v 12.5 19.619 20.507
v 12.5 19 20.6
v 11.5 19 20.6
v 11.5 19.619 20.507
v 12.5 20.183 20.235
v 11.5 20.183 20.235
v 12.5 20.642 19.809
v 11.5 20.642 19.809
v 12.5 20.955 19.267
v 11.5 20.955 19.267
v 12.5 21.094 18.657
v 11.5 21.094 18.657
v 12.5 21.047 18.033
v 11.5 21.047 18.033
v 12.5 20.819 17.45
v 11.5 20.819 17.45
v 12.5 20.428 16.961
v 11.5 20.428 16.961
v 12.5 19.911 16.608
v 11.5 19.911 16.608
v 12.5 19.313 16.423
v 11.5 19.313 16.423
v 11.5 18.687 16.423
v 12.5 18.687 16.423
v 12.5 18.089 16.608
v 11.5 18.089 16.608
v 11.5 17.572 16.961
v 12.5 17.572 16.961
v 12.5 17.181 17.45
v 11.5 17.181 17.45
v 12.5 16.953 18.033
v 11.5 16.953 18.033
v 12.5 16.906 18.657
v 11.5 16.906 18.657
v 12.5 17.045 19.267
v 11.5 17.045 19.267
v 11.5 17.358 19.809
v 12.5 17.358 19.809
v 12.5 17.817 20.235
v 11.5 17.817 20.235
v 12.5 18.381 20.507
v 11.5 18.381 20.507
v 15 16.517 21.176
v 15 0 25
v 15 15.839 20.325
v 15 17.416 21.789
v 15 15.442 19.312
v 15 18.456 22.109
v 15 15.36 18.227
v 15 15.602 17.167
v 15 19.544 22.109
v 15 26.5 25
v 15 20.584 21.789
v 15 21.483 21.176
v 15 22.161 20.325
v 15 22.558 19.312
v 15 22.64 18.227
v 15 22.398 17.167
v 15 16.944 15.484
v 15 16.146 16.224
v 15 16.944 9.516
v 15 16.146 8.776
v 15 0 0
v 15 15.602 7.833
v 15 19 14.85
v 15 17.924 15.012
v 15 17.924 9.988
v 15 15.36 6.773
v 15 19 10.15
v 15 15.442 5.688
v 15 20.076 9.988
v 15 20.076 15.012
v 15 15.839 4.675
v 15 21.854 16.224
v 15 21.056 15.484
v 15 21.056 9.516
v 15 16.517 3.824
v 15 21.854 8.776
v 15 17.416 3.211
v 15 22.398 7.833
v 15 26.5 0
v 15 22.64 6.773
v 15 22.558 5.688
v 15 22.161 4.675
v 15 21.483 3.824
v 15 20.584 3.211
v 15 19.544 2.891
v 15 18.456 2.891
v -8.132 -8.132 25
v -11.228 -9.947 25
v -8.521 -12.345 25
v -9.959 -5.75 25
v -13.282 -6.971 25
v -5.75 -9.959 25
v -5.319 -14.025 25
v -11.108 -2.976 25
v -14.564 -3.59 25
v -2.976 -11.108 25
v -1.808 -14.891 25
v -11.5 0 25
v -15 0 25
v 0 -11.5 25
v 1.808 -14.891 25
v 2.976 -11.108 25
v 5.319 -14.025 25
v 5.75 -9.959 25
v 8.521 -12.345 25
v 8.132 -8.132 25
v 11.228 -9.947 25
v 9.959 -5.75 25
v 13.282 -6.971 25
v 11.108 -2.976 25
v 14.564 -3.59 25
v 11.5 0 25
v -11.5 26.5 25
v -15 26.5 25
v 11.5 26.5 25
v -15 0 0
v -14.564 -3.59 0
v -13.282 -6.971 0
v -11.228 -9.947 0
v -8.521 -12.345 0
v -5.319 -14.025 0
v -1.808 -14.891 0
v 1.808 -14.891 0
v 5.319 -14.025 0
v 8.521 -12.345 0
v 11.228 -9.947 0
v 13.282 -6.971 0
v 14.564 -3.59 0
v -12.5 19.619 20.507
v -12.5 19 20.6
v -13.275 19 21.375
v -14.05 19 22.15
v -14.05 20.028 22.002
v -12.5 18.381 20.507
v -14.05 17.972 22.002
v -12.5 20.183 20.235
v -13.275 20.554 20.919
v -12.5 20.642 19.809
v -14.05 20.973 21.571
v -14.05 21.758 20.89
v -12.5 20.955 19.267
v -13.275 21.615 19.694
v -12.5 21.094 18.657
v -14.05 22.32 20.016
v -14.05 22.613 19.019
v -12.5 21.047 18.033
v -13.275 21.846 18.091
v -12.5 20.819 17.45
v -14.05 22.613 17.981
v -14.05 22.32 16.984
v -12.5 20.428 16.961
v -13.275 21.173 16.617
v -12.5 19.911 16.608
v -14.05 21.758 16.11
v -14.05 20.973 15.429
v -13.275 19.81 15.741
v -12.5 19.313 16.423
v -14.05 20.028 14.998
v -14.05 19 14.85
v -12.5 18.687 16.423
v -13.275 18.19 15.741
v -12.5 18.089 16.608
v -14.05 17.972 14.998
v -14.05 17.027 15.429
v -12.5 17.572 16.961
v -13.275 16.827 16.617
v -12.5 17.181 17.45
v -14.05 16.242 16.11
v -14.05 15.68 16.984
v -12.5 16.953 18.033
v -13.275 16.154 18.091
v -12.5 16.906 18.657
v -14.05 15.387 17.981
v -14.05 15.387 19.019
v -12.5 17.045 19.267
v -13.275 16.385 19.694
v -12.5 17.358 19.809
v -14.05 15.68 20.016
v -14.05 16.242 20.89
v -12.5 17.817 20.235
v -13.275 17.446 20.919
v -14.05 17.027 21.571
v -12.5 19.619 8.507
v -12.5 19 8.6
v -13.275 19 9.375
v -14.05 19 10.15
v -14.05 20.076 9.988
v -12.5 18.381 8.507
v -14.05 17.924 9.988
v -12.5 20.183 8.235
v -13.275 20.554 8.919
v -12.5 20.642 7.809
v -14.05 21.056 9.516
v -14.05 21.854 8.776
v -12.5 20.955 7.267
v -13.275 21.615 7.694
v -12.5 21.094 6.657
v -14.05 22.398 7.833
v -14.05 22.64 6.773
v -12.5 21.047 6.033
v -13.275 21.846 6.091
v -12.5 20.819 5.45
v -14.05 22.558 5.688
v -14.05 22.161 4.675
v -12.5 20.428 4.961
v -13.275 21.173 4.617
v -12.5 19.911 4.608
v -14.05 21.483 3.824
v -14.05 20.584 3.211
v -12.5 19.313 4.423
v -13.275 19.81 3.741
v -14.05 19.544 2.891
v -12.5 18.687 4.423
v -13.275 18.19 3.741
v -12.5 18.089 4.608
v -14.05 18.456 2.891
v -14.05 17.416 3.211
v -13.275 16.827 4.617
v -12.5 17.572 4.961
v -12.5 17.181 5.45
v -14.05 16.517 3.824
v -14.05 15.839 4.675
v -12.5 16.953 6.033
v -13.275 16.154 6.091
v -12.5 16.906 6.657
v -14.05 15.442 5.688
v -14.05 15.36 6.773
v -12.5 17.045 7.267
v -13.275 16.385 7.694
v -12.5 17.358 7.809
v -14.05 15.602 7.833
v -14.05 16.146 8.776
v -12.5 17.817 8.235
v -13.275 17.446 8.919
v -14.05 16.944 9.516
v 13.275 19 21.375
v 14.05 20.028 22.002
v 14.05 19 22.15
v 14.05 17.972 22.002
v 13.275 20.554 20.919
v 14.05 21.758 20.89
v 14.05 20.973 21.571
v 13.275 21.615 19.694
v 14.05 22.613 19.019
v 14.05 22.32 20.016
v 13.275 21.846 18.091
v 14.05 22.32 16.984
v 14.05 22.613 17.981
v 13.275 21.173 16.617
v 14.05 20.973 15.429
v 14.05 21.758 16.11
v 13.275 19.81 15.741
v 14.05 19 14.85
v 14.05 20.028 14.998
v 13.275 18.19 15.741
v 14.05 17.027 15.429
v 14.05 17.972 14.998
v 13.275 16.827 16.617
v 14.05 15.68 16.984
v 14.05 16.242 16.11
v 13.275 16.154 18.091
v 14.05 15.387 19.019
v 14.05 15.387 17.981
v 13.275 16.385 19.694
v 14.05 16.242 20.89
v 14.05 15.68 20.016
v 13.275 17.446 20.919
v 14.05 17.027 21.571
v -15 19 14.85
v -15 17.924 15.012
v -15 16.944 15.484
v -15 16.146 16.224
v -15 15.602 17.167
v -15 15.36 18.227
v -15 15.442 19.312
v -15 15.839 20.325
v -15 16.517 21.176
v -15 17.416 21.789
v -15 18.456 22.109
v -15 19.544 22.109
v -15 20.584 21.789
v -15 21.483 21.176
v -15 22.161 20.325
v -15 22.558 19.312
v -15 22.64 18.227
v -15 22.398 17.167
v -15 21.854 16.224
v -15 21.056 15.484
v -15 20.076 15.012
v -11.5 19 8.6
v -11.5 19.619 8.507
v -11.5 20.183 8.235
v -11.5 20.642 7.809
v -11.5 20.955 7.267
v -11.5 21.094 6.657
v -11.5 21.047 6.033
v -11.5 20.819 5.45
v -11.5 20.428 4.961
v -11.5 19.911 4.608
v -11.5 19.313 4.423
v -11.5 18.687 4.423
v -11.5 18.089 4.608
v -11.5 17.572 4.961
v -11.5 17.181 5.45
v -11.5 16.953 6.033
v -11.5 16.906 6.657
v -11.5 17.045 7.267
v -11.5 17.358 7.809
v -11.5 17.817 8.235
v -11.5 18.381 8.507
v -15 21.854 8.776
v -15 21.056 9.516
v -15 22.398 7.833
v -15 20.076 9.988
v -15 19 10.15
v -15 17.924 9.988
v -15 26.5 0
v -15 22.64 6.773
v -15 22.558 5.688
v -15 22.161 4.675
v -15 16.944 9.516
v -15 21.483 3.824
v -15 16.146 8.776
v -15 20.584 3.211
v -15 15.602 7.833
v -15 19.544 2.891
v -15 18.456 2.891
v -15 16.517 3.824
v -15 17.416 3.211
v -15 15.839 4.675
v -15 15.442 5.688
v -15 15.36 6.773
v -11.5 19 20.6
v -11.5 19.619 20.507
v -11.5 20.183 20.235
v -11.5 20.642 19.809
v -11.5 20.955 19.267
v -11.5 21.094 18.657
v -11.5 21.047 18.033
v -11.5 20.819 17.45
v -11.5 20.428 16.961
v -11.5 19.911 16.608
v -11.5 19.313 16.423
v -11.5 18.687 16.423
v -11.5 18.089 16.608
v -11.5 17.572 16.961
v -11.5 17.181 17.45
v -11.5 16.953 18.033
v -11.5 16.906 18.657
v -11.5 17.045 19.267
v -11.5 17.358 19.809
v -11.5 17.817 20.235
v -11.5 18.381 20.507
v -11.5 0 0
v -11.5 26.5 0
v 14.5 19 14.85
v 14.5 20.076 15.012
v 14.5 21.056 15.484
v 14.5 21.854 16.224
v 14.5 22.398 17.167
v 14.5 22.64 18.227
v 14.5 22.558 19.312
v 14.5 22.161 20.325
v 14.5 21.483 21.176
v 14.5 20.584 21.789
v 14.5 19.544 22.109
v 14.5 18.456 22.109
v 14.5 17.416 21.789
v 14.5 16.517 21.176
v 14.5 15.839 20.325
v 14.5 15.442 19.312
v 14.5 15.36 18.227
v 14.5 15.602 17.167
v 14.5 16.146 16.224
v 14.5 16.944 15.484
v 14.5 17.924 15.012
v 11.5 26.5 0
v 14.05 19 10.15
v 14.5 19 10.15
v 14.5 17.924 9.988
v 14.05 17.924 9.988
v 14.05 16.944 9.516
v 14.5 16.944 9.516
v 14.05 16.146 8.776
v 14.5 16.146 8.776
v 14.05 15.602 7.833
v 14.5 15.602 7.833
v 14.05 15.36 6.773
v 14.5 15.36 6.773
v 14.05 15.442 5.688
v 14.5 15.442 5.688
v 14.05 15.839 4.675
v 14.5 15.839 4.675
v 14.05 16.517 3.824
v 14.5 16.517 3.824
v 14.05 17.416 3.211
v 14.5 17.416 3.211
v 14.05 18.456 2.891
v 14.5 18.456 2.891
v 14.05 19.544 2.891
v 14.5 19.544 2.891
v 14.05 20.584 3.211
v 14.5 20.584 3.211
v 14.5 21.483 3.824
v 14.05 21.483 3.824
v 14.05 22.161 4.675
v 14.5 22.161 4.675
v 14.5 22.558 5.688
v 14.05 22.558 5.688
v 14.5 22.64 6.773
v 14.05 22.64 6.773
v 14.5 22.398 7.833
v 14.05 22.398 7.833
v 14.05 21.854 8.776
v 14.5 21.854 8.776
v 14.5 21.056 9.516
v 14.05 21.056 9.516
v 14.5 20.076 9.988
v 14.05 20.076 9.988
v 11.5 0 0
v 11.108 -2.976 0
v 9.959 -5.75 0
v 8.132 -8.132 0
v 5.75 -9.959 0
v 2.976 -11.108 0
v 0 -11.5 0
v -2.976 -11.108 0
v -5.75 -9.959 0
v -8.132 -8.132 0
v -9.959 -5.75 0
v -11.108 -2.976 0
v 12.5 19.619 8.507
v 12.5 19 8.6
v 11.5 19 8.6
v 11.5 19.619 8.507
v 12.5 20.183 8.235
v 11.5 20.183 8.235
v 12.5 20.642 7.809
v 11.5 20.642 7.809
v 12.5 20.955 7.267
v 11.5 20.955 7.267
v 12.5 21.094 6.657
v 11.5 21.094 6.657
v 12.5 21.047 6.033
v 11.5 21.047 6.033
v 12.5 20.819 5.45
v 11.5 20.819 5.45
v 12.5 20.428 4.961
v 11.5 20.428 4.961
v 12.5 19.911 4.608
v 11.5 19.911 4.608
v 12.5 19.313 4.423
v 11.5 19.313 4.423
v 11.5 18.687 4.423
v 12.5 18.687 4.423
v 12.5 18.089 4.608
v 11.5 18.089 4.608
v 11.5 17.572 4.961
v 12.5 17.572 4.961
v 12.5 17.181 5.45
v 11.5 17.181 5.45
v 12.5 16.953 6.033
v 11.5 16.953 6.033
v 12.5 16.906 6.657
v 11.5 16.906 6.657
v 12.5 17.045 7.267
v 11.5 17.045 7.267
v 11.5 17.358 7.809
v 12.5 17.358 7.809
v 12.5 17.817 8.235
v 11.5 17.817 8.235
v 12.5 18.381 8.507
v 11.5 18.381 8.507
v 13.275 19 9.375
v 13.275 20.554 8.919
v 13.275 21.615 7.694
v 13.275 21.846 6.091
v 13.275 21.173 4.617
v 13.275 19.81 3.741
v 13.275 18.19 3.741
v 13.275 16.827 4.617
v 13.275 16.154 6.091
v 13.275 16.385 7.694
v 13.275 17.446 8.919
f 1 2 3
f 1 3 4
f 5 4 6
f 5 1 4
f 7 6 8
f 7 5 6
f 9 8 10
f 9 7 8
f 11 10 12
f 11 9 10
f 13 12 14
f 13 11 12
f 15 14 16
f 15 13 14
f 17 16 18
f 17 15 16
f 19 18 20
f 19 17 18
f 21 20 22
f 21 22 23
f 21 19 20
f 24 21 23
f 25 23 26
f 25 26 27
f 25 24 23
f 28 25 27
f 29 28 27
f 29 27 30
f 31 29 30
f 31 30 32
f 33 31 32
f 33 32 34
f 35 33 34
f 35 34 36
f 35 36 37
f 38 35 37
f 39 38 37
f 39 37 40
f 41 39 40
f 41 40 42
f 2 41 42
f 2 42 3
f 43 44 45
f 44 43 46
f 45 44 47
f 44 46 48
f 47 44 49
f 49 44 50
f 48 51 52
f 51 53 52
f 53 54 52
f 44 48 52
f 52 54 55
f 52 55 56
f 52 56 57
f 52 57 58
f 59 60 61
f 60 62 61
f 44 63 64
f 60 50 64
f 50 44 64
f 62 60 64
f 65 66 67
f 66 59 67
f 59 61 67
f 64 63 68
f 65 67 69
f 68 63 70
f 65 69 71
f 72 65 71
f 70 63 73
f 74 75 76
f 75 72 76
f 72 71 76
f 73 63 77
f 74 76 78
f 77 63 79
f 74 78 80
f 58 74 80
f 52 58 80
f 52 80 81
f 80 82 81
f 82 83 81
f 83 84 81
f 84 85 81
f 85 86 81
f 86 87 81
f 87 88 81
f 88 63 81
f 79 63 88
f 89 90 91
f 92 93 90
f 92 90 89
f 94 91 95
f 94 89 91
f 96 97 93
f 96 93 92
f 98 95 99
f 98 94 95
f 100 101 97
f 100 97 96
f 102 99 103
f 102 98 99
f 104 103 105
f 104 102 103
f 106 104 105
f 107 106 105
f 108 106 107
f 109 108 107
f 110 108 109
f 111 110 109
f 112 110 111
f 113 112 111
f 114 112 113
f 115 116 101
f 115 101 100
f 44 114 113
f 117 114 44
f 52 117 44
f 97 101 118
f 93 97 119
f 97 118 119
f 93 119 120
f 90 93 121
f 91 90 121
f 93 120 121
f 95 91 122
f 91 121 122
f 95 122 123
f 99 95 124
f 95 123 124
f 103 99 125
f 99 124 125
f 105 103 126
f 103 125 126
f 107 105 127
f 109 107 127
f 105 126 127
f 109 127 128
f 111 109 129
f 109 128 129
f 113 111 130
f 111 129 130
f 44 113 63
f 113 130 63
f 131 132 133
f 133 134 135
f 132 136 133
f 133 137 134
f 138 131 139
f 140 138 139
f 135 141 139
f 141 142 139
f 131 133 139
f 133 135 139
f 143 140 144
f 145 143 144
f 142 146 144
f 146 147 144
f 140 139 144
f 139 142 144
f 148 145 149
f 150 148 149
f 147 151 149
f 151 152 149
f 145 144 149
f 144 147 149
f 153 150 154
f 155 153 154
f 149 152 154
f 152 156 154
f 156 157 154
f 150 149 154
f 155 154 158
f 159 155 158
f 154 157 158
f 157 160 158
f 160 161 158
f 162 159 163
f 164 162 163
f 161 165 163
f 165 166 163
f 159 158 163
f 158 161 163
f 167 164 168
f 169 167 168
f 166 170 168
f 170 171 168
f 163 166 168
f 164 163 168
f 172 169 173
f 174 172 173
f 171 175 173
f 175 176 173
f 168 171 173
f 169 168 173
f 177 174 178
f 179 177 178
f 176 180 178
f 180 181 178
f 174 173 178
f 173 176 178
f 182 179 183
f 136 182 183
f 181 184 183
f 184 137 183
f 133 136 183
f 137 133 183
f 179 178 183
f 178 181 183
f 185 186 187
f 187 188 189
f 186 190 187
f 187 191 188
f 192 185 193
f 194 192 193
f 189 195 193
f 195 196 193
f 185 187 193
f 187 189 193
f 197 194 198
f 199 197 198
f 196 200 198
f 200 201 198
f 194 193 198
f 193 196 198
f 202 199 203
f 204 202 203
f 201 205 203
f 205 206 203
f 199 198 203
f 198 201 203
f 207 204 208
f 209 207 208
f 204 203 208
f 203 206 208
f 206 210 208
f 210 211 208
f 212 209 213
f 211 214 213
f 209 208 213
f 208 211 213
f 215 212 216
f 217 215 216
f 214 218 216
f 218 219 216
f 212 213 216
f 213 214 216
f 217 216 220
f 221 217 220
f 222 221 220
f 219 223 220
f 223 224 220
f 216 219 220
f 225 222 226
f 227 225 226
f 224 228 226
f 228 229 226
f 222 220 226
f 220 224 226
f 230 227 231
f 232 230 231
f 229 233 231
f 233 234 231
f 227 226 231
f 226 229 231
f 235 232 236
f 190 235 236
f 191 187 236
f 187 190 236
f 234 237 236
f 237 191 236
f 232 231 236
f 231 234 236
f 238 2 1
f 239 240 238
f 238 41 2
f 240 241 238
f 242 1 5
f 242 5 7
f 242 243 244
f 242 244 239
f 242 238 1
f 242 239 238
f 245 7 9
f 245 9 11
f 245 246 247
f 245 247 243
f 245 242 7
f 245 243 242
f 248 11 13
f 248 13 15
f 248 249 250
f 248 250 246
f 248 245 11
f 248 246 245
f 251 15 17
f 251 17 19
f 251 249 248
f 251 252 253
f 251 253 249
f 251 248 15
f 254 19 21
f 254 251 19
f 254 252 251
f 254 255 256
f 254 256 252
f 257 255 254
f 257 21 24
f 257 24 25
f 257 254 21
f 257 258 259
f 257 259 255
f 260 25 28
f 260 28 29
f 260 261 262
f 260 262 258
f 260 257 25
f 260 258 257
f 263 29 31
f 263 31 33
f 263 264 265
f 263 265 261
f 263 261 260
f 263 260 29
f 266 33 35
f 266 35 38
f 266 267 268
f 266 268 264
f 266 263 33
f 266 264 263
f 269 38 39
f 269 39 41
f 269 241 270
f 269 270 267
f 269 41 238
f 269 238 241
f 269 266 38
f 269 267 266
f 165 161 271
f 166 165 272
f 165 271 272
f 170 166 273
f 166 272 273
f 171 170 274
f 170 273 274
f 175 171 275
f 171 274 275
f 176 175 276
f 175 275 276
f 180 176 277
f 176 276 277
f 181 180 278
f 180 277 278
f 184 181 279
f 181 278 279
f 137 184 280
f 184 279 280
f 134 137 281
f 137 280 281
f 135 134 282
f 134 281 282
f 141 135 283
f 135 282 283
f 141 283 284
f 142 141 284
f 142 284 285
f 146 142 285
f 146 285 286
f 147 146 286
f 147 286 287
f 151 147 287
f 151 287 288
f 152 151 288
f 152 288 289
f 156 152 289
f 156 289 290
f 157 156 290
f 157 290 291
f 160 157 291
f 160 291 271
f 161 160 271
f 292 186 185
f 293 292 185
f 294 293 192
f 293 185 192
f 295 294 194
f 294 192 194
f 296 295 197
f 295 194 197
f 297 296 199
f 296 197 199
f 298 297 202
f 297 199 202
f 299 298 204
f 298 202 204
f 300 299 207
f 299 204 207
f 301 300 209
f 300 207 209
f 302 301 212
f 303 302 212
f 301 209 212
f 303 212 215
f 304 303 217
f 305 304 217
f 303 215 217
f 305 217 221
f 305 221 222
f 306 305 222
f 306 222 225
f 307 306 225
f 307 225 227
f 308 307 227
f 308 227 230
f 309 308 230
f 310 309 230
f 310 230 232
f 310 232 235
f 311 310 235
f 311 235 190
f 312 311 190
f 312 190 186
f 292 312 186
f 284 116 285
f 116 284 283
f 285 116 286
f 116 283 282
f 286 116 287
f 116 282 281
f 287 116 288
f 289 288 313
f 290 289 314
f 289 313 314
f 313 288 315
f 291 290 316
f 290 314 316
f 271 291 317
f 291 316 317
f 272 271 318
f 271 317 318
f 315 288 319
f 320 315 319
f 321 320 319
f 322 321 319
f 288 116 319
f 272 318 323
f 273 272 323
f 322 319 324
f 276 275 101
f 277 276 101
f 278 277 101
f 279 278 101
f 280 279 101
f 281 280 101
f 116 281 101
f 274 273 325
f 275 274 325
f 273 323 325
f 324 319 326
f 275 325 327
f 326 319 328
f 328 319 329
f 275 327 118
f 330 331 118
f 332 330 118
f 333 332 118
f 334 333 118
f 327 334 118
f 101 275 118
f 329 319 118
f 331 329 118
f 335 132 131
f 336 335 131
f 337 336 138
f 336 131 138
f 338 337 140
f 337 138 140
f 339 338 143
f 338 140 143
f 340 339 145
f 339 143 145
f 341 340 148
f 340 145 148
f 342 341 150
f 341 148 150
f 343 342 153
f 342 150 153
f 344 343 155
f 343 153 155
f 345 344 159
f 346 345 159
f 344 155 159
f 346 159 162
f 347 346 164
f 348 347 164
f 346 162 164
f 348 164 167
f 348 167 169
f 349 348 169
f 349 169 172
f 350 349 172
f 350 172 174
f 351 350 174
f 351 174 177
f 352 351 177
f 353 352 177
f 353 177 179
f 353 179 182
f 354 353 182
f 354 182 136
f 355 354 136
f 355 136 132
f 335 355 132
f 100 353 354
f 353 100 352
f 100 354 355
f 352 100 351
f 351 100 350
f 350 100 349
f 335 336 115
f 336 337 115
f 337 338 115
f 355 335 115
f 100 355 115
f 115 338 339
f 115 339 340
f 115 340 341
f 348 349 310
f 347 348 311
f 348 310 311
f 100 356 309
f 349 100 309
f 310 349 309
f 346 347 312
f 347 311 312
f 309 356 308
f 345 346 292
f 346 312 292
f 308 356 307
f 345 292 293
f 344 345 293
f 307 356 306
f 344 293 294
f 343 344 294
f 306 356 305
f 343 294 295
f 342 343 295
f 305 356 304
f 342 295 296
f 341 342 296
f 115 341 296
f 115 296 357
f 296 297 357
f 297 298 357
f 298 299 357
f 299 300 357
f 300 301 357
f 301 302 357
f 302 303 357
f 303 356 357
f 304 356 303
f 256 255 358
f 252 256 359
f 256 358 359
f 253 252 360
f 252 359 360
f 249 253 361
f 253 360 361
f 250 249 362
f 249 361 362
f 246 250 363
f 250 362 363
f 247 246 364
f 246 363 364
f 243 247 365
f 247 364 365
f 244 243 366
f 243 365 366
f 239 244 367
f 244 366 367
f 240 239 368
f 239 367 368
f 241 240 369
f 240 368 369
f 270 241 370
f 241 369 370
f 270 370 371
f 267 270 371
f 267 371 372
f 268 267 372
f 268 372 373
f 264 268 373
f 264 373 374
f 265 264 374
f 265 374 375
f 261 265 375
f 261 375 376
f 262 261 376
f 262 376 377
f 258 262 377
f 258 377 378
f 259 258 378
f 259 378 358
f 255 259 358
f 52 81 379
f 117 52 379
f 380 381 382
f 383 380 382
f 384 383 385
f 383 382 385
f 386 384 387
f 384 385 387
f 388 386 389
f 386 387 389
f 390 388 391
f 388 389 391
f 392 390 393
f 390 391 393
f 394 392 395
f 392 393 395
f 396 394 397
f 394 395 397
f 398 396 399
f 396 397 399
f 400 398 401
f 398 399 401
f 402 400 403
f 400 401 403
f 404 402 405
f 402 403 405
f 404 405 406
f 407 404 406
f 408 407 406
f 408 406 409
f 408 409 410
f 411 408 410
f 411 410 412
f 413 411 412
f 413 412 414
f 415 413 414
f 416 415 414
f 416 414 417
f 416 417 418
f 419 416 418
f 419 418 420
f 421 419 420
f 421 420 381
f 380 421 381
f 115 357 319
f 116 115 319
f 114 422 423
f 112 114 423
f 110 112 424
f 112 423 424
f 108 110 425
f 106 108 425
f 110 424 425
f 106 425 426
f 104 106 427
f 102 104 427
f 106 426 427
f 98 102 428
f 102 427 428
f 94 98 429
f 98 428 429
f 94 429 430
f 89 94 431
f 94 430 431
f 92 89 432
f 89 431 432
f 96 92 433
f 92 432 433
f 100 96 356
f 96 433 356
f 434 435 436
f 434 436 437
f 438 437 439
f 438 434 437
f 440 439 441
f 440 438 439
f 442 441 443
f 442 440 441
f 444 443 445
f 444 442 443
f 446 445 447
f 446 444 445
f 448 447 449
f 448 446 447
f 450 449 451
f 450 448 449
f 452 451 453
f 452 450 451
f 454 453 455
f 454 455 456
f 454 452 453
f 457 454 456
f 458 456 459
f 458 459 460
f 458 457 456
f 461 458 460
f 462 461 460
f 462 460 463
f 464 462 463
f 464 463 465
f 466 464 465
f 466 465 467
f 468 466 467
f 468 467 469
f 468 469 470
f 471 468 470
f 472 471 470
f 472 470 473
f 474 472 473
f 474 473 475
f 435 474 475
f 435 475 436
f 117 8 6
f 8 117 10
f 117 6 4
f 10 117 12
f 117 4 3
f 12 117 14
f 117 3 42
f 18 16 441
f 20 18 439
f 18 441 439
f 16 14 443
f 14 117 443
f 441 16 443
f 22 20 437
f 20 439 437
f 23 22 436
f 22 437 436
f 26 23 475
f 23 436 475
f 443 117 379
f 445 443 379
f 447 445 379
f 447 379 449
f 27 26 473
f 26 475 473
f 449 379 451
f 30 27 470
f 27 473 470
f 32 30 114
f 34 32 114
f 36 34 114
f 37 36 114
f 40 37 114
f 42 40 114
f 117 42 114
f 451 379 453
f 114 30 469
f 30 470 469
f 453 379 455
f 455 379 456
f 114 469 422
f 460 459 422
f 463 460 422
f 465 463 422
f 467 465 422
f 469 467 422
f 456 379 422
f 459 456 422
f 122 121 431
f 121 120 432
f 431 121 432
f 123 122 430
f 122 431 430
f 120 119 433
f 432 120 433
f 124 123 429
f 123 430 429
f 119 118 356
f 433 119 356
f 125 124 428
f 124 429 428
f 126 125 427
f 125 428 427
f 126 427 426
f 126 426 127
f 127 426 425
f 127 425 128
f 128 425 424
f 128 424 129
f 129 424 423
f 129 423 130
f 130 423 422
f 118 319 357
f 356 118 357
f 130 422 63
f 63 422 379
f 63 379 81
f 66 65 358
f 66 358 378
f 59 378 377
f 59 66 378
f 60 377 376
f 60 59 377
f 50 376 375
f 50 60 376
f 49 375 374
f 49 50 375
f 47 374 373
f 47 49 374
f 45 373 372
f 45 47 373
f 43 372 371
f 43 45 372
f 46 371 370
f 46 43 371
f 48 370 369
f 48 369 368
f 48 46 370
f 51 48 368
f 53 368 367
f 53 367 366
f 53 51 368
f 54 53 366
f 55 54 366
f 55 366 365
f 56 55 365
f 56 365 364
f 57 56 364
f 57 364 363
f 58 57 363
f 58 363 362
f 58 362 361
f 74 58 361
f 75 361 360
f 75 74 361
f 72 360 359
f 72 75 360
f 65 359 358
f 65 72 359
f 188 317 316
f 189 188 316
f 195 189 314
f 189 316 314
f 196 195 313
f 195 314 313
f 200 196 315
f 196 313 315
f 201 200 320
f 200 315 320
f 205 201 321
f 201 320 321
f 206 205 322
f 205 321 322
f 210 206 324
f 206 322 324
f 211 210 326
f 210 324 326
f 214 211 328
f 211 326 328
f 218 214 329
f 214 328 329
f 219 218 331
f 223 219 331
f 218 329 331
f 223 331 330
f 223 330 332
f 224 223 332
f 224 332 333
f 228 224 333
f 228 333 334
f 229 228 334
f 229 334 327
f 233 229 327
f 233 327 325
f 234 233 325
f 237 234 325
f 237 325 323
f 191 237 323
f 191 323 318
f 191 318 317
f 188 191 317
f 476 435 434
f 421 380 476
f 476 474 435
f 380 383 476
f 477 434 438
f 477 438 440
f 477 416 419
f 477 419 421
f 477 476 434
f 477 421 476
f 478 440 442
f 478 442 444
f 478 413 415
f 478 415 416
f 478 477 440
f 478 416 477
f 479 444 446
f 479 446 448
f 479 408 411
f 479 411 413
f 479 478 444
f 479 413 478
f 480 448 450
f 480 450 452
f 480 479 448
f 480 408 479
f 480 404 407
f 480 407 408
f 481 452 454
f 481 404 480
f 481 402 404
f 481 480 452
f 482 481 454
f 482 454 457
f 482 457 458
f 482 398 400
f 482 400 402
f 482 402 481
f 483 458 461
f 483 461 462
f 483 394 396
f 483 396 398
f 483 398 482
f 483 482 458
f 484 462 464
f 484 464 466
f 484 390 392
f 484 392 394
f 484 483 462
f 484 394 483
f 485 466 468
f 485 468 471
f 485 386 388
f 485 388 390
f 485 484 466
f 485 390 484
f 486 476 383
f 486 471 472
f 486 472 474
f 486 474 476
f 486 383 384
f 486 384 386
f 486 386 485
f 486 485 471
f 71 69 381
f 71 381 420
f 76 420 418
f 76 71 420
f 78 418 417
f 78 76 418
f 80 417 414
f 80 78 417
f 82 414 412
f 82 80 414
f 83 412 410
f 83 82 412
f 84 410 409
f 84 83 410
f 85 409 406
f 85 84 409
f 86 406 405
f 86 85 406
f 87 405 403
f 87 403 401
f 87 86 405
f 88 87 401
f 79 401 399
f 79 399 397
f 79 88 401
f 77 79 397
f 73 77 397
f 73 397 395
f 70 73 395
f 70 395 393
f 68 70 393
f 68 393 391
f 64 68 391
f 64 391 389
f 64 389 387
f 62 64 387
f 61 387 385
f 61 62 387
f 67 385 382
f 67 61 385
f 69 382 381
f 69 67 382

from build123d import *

# Parameters (mm, degrees)
EXTRUDE_1391_DEPTH               = 25
CUT_EXTRUDE_1919_REACH           = 49.194
SKETCH_1505_R                    = 2.1
SKETCH_2_3_R                     = 3.65
SKETCH_2_3_R_2                   = 2.1
CUT_EXTRUDE_1959_DEPTH           = 0.5
CHAMFER_2009_SIZE                = 2
CHAMFER_2009_OF_MIRROR_2081_SIZE = 2


with BuildPart() as part:
    # Sketch 313 → Extrude 1391 (new body)
    with BuildSketch(Plane.XY):
        with BuildLine():
            Line((-11.5, 0), (-11.5, 26.5))
            Line((-11.5, 26.5), (-15, 26.5))
            Line((-15, 26.5), (-15, 0))
            ThreePointArc((-15, 0), (0, -15), (15, 0))
            Line((15, 0), (15, 26.5))
            Line((15, 26.5), (11.5, 26.5))
            Line((11.5, 26.5), (11.5, 0))
            ThreePointArc((11.5, 0), (0, -11.5), (-11.5, 0))
        make_face()
    extrude(amount=EXTRUDE_1391_DEPTH)

    # Sketch 1505 → Cut-Extrude 1919 (cut, up to next)
    with BuildSketch(Plane.ZY.offset(15), mode=Mode.PRIVATE) as cut_extrude_1919_sk1:
        with Locations((6.5, 19)):
            Circle(SKETCH_1505_R)
    cut_extrude_1919_tool1 = extrude(cut_extrude_1919_sk1.sketch, amount=-CUT_EXTRUDE_1919_REACH, mode=Mode.PRIVATE) & part.part
    # Sketch 1505 → Cut-Extrude 1919 (cut, up to next)
    with BuildSketch(Plane.ZY.offset(15), mode=Mode.PRIVATE) as cut_extrude_1919_sk2:
        with Locations((18.5, 19)):
            Circle(SKETCH_1505_R)
    cut_extrude_1919_tool2 = extrude(cut_extrude_1919_sk2.sketch, amount=-CUT_EXTRUDE_1919_REACH, mode=Mode.PRIVATE) & part.part
    cut_extrude_1919_1 = cut_extrude_1919_tool1.solids().sort_by_distance((-15, 19, 6.5))[0]
    add(cut_extrude_1919_1, mode=Mode.SUBTRACT)
    cut_extrude_1919_2 = cut_extrude_1919_tool2.solids().sort_by_distance((-15, 19, 18.5))[0]
    add(cut_extrude_1919_2, mode=Mode.SUBTRACT)
    cut_extrude_1919 = cut_extrude_1919_1 + cut_extrude_1919_2  # Cut-Extrude 1919 as one shape, for the pattern or mirror that repeats it

    # Эскиз2<3> → Cut-Extrude 1959 (cut)
    # profile 1 of 2: a face of its own
    with BuildSketch(Plane.ZY.offset(15)):
        with Locations((6.5, 19)):
            Circle(SKETCH_2_3_R)
        with Locations((6.5, 19)):
            Circle(SKETCH_2_3_R_2, mode=Mode.SUBTRACT)
    # profile 2 of 2: a face of its own
    with BuildSketch(Plane.ZY.offset(15)):
        with Locations(Location((18.5, 19, 0), (0, 0, 180))):
            Circle(SKETCH_2_3_R)
        with Locations((18.5, 19)):
            Circle(SKETCH_2_3_R_2, mode=Mode.SUBTRACT)
    cut_extrude_1959 = extrude(amount=-CUT_EXTRUDE_1959_DEPTH, mode=Mode.SUBTRACT)

    # Chamfer 2009
    # the kernel refuses this chamfer: 2 mm, written as the material it takes off along each edge
    with BuildSketch(Plane(origin=(-14.5, 19, 18.5), x_dir=(0, 0, 1), z_dir=(0, -1, 0))) as chamfer_2009_piece_1_section:
        Polygon((2.1, -CHAMFER_2009_SIZE), (2.1 + CHAMFER_2009_SIZE, 0), (2.1, 0), align=None)
    chamfer_2009_piece_1 = revolve(axis=Axis((-14.5, 19, 18.5), (-1, 0, 0)), mode=Mode.PRIVATE)
    chamfer_2009_piece_1 = chamfer_2009_piece_1 & Plane(origin=(-13.269804267, 19, 18.5), x_dir=(0, 0, -1), z_dir=(-1, 0, 0)) * Cylinder(3.65, 17, mode=Mode.PRIVATE)
    add(chamfer_2009_piece_1, mode=Mode.SUBTRACT)
    with BuildSketch(Plane(origin=(-14.5, 19, 6.5), x_dir=(0, 0, 1), z_dir=(0, -1, 0))) as chamfer_2009_piece_2_section:
        Polygon((2.1, -CHAMFER_2009_SIZE), (2.1 + CHAMFER_2009_SIZE, 0), (2.1, 0), align=None)
    chamfer_2009_piece_2 = revolve(axis=Axis((-14.5, 19, 6.5), (-1, 0, 0)), mode=Mode.PRIVATE)
    chamfer_2009_piece_2 = chamfer_2009_piece_2 & Plane(origin=(-13.269804267, 19, 6.5), x_dir=(0, 0, 1), z_dir=(-1, 0, 0)) * Cylinder(3.65, 17, mode=Mode.PRIVATE)
    add(chamfer_2009_piece_2, mode=Mode.SUBTRACT)

    # Mirror 2081: Cut-Extrude 1919, Cut-Extrude 1959 across plane
    add(cut_extrude_1919.mirror(Plane(origin=(0, 0, 0), x_dir=(0, 0, 1), z_dir=(1, 0, 0))), mode=Mode.SUBTRACT)
    add(cut_extrude_1959.mirror(Plane(origin=(0, 0, 0), x_dir=(0, 0, 1), z_dir=(1, 0, 0))), mode=Mode.SUBTRACT)

    # Chamfer 2009 of Mirror 2081
    # the kernel refuses this chamfer: 2 mm, written as the material it takes off along each edge
    with BuildSketch(Plane(origin=(14.5, 19, 18.5), x_dir=(0, 0, 1), z_dir=(0, -1, 0))) as chamfer_2009_of_mirror_2081_piece_1_section:
        Polygon((2.1, CHAMFER_2009_OF_MIRROR_2081_SIZE), (2.1 + CHAMFER_2009_OF_MIRROR_2081_SIZE, 0), (2.1, 0), align=None)
    chamfer_2009_of_mirror_2081_piece_1 = revolve(axis=Axis((14.5, 19, 18.5), (-1, 0, 0)), mode=Mode.PRIVATE)
    chamfer_2009_of_mirror_2081_piece_1 = chamfer_2009_of_mirror_2081_piece_1 & Plane(origin=(13.269804267, 19, 18.5), x_dir=(0, 0, -1), z_dir=(1, 0, 0)) * Cylinder(3.65, 17, mode=Mode.PRIVATE)
    add(chamfer_2009_of_mirror_2081_piece_1, mode=Mode.SUBTRACT)
    with BuildSketch(Plane(origin=(14.5, 19, 6.5), x_dir=(0, 0, 1), z_dir=(0, -1, 0))) as chamfer_2009_of_mirror_2081_piece_2_section:
        Polygon((2.1, CHAMFER_2009_OF_MIRROR_2081_SIZE), (2.1 + CHAMFER_2009_OF_MIRROR_2081_SIZE, 0), (2.1, 0), align=None)
    chamfer_2009_of_mirror_2081_piece_2 = revolve(axis=Axis((14.5, 19, 6.5), (-1, 0, 0)), mode=Mode.PRIVATE)
    chamfer_2009_of_mirror_2081_piece_2 = chamfer_2009_of_mirror_2081_piece_2 & Plane(origin=(13.269804267, 19, 6.5), x_dir=(0, 0, 1), z_dir=(1, 0, 0)) * Cylinder(3.65, 17, mode=Mode.PRIVATE)
    add(chamfer_2009_of_mirror_2081_piece_2, mode=Mode.SUBTRACT)


solid = part.part
